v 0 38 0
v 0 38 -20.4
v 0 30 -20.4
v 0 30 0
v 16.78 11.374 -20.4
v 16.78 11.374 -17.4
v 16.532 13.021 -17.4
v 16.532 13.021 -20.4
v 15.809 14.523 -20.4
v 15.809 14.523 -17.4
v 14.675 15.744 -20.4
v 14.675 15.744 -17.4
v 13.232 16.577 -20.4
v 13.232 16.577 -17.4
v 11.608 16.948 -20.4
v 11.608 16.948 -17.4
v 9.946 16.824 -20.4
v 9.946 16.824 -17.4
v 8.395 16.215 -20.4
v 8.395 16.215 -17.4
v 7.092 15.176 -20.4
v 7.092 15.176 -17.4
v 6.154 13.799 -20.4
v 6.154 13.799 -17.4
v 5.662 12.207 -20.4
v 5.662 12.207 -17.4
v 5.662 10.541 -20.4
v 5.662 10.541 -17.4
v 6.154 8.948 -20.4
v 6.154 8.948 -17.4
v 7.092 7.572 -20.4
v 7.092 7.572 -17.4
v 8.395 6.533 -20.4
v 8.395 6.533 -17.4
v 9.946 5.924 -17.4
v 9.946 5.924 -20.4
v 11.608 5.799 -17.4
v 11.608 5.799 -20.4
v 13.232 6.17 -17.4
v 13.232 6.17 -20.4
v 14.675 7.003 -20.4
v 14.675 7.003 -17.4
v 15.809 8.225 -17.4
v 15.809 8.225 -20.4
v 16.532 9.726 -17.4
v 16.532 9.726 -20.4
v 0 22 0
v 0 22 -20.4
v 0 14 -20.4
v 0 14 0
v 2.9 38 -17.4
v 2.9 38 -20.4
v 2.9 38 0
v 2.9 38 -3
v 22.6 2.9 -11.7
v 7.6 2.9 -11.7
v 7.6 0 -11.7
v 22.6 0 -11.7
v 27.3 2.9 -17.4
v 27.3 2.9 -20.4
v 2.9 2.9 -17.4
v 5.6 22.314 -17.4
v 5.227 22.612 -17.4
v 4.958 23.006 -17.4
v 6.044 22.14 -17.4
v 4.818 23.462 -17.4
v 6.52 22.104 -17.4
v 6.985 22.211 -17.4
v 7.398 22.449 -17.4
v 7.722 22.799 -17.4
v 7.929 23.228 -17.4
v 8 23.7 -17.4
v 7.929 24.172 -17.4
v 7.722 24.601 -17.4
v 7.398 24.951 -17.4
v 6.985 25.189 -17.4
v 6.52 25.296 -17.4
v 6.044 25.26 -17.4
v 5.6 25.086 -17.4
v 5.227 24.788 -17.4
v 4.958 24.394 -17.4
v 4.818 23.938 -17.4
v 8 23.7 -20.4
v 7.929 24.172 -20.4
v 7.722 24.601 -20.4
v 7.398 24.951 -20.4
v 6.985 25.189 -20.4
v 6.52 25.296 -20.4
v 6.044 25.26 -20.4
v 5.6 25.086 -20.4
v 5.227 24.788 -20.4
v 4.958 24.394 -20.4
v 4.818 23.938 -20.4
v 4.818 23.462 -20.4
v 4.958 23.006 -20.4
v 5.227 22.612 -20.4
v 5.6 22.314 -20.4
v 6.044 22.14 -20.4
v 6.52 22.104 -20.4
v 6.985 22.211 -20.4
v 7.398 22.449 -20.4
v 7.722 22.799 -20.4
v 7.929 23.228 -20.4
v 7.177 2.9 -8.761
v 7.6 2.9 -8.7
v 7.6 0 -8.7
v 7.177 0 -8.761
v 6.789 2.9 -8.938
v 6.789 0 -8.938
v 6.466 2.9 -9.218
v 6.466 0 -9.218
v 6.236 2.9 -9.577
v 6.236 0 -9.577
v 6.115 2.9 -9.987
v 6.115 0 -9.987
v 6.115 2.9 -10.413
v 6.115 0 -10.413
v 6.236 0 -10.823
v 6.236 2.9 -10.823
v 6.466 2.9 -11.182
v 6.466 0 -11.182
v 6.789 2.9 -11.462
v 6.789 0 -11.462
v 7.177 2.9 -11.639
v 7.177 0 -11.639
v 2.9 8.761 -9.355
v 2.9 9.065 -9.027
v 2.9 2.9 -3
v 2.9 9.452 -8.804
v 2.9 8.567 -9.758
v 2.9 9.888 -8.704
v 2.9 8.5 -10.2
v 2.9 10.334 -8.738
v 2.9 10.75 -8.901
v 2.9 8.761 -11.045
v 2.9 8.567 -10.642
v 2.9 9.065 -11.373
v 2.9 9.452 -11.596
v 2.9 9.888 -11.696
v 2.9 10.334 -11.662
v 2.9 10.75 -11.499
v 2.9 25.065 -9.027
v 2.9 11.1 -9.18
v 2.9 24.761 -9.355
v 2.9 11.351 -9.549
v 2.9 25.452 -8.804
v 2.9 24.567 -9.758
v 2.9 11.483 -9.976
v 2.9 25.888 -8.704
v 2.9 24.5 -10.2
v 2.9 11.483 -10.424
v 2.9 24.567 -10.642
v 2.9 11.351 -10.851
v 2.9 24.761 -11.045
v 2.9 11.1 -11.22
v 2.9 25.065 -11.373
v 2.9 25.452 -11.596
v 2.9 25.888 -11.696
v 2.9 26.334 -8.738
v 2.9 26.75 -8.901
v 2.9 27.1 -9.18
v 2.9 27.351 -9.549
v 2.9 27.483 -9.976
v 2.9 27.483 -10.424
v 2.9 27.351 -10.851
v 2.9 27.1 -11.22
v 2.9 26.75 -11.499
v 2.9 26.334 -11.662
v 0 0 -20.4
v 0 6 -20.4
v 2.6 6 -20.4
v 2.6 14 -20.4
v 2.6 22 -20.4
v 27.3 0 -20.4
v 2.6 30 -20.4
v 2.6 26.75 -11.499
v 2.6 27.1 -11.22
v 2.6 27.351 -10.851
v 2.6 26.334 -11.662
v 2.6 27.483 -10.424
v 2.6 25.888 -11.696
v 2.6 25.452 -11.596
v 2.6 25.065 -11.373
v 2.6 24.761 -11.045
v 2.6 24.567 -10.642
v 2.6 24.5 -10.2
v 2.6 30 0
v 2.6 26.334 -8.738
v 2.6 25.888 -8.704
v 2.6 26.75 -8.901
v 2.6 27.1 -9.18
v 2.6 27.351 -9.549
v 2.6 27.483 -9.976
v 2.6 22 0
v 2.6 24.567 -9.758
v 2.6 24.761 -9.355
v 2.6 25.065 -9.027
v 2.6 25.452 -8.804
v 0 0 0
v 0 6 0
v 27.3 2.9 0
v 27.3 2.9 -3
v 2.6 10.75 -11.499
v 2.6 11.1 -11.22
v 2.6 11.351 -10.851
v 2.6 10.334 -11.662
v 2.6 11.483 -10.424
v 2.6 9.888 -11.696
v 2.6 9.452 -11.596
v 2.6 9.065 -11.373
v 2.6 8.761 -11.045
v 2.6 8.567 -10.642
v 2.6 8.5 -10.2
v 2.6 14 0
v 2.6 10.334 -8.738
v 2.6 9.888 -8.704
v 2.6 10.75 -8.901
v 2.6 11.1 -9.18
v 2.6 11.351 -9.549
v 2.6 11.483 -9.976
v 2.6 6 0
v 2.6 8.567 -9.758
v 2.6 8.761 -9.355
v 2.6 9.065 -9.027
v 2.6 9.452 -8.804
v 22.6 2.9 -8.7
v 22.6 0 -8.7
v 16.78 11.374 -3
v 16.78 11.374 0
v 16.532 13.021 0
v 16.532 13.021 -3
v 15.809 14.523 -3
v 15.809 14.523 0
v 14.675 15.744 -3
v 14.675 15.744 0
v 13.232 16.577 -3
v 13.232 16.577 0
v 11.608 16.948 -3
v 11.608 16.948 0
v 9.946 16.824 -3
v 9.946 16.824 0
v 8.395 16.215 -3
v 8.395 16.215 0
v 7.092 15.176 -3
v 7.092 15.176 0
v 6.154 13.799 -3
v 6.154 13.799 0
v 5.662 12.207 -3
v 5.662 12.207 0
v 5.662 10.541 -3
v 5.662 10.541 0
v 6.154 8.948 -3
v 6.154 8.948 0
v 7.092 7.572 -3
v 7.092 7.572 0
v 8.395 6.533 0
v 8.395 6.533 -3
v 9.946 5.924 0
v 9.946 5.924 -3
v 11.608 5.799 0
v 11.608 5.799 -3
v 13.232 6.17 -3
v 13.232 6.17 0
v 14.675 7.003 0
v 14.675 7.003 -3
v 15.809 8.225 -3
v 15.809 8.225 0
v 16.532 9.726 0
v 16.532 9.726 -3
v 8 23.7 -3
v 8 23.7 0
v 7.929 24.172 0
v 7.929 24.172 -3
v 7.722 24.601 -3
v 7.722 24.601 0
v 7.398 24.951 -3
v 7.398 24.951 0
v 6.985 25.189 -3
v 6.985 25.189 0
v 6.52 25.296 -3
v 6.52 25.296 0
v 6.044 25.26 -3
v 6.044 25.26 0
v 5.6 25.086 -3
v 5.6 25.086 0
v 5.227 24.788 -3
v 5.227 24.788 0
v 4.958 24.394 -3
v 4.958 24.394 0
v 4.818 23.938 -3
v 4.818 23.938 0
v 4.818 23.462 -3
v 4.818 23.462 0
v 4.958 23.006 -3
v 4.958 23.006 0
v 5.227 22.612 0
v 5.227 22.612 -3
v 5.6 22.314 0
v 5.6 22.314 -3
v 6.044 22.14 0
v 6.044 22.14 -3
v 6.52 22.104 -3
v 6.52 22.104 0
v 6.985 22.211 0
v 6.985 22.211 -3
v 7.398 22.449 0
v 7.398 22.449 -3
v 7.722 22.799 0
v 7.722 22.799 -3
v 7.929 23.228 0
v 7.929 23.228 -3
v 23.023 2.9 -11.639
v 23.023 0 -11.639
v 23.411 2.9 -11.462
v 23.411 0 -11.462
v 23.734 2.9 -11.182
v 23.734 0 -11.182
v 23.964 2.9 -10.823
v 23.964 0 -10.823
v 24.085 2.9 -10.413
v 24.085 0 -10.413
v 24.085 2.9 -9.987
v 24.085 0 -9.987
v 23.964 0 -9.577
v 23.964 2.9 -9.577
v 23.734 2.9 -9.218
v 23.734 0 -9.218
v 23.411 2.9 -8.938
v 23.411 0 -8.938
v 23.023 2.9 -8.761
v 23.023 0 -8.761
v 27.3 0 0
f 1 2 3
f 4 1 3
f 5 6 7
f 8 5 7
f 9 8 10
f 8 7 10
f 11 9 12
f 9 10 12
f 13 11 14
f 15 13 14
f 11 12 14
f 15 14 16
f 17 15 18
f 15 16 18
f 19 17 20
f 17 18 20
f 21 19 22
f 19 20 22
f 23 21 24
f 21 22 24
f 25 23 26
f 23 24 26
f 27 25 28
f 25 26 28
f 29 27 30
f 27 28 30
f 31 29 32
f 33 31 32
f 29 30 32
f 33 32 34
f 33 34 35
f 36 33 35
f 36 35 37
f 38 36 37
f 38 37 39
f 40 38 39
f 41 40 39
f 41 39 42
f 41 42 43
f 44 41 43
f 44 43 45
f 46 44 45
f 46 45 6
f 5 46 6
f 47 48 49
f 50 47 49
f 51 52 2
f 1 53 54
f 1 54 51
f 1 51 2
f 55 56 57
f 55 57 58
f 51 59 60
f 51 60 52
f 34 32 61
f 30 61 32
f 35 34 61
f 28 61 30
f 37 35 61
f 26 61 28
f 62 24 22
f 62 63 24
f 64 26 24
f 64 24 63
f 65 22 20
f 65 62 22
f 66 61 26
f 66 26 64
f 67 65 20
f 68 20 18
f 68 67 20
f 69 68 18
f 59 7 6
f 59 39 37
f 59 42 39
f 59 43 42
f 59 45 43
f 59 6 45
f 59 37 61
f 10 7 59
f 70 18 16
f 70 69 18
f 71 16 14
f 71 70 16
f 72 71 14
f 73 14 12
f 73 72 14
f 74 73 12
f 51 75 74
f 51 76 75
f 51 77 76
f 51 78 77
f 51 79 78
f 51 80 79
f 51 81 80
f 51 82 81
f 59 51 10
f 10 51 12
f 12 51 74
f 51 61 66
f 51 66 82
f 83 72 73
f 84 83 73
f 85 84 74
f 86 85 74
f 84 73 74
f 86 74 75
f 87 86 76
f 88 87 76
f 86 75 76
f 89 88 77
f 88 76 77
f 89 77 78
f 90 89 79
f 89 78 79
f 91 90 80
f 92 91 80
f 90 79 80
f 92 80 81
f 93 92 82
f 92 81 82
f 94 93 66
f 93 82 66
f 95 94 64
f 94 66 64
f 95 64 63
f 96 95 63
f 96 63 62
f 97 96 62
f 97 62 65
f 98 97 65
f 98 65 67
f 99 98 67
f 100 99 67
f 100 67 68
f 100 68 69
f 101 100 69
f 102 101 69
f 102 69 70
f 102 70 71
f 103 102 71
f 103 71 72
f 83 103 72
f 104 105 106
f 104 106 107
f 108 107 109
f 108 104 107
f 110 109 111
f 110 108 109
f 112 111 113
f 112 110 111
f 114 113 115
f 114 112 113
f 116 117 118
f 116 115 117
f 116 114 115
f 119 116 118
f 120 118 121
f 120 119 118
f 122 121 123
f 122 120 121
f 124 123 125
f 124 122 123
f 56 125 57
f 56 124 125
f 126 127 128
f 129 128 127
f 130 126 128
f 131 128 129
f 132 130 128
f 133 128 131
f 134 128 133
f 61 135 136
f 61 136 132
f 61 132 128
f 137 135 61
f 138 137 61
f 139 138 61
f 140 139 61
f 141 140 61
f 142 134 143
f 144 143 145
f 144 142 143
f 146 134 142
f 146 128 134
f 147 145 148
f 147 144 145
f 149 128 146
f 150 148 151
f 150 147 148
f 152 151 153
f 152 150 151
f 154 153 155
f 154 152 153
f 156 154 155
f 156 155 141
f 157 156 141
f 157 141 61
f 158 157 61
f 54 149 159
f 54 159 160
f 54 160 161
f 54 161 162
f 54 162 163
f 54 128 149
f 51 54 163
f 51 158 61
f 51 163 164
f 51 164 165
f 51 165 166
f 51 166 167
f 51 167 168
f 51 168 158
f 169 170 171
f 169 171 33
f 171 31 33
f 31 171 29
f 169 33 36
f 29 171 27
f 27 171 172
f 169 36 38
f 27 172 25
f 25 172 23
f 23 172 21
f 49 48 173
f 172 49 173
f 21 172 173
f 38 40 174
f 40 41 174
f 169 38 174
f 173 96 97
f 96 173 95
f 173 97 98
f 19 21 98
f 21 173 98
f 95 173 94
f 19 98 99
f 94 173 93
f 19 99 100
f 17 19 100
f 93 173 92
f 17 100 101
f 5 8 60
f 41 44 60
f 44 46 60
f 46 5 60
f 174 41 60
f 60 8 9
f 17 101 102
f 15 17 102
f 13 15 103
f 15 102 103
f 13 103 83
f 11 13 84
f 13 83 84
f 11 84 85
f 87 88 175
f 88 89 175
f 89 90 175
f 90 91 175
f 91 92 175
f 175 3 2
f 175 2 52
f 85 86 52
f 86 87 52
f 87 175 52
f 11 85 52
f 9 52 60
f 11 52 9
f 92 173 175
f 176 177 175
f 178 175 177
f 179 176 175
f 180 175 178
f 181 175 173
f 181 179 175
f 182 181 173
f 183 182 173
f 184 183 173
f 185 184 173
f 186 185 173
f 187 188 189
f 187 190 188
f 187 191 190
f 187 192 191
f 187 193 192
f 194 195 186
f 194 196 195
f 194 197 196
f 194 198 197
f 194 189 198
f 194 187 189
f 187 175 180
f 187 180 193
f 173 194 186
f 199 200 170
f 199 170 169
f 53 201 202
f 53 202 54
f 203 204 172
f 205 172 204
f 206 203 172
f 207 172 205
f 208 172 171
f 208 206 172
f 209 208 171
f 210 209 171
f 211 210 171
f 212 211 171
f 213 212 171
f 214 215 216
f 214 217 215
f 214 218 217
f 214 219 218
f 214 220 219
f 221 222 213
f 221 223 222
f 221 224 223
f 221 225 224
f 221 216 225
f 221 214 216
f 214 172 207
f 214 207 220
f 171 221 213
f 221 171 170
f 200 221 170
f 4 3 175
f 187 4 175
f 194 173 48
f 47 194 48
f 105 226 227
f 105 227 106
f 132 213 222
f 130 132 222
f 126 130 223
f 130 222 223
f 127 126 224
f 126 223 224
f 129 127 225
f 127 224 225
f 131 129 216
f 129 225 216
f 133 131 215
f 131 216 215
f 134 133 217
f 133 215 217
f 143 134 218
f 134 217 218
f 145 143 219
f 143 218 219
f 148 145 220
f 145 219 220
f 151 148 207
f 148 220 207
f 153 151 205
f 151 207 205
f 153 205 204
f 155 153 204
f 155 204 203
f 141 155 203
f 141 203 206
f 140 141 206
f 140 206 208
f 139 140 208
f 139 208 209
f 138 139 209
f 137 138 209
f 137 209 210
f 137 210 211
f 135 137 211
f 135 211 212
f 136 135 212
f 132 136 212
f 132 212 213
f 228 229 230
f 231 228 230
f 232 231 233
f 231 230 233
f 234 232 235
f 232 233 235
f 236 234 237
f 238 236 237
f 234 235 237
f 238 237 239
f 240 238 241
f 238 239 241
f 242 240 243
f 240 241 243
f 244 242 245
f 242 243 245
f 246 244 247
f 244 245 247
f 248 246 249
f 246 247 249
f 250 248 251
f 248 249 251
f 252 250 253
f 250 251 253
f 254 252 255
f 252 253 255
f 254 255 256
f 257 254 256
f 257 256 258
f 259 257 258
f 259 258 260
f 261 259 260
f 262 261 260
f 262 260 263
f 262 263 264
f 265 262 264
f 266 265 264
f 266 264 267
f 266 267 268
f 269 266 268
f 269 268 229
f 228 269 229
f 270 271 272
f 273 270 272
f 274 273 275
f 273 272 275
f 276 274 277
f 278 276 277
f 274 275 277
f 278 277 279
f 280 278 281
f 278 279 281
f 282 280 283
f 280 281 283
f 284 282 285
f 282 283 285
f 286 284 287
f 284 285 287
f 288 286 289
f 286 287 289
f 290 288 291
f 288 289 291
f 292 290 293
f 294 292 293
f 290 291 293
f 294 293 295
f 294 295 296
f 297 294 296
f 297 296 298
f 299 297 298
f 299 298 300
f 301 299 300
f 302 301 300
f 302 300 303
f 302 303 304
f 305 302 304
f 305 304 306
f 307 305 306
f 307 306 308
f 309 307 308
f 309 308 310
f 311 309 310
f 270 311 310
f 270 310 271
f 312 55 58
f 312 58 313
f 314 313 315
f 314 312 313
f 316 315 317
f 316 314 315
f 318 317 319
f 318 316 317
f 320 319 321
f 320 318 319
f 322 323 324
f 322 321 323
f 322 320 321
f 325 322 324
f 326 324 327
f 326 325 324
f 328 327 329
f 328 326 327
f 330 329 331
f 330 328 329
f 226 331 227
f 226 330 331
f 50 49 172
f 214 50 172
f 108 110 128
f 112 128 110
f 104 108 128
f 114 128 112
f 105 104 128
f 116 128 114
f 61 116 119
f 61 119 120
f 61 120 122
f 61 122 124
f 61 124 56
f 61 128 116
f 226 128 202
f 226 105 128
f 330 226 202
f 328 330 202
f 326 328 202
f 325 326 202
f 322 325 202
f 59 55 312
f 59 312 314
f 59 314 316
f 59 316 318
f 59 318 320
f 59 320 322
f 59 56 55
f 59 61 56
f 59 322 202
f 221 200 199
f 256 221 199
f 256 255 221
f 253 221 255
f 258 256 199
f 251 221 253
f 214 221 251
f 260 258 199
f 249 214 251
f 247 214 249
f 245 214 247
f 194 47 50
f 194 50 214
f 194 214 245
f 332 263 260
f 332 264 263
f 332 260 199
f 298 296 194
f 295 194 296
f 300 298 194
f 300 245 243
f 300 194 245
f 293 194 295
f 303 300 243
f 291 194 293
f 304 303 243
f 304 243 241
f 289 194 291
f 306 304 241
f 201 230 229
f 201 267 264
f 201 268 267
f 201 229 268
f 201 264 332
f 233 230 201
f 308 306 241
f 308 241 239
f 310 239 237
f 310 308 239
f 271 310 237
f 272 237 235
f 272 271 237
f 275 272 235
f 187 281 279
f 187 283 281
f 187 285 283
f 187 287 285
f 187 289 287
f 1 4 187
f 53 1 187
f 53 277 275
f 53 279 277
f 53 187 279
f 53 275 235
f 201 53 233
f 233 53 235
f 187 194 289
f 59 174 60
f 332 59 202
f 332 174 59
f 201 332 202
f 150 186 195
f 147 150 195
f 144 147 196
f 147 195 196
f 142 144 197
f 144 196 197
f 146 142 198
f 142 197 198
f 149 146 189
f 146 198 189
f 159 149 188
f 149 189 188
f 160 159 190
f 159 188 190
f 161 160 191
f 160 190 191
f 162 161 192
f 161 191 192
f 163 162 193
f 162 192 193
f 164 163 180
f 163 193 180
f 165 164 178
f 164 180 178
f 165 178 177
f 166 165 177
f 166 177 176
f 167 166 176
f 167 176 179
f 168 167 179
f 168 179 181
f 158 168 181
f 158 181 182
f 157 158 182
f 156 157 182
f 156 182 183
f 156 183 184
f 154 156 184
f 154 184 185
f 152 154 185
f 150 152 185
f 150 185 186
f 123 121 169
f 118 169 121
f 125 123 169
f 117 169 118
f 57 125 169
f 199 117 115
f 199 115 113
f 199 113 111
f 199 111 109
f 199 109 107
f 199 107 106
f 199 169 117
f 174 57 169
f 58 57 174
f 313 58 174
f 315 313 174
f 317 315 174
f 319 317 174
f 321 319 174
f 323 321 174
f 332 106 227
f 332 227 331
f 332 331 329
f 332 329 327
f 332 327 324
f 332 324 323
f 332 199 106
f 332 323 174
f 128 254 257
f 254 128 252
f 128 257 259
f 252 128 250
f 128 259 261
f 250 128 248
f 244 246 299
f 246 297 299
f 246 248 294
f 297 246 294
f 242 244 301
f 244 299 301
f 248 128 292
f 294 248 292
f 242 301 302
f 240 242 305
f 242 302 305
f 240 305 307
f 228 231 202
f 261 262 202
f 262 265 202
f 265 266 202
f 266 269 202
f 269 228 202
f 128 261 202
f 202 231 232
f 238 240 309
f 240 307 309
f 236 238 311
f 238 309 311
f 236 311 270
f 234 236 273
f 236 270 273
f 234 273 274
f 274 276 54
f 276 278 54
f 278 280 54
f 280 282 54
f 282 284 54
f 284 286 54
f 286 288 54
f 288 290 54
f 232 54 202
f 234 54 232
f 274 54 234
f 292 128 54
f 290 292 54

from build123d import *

# Parameters (mm, degrees)
CROQUIS1_R              = 5.59
CROQUIS1_R_2            = 1.6
SALIENTE_EXTRUIR1_DEPTH = 20.4
CROQUIS2_W              = 24.4
CROQUIS2_H              = 14.4
CORTAR_EXTRUIR1_DEPTH   = 35.1
CROQUIS3_R              = 1.5
CORTAR_EXTRUIR2_DEPTH   = 10
CORTAR_EXTRUIR3_DEPTH   = 10


with BuildPart() as part:
    # Croquis1 → Saliente-Extruir1 (new body)
    with BuildSketch(Plane.XY):
        Polygon((0, 0), (27.3, 0), (27.3, 2.9), (2.9, 38), (0, 38), (0, 30), (2.6, 30), (2.6, 22), (0, 22), (0, 14), (2.6, 14), (2.6, 6), (0, 6), align=None)
        with Locations((11.19, 11.3737)):
            Circle(CROQUIS1_R, mode=Mode.SUBTRACT)
        with Locations((6.4, 23.7)):
            Circle(CROQUIS1_R_2, mode=Mode.SUBTRACT)
    extrude(amount=-SALIENTE_EXTRUIR1_DEPTH)

    # Croquis2 → Cortar-Extruir1 (cut)
    with BuildSketch(Plane(origin=(0, 38, 0), x_dir=(1, 0, 0), z_dir=(0, 1, 0))):
        with Locations((15.1, 10.2)):
            Rectangle(CROQUIS2_W, CROQUIS2_H)
    extrude(amount=-CORTAR_EXTRUIR1_DEPTH, mode=Mode.SUBTRACT)

    # Croquis3 → Cortar-Extruir2 (cut)
    with BuildSketch(Plane.ZY.offset(-2.6)):
        with Locations(Location((-10.2, 26, 0), (0, 0, 270))):
            Circle(CROQUIS3_R)
        with Locations(Location((-10.2, 10, 0), (0, 0, 270))):
            Circle(CROQUIS3_R)
    extrude(amount=-CORTAR_EXTRUIR2_DEPTH, mode=Mode.SUBTRACT)

    # Croquis4 → Cortar-Extruir3 (cut)
    with BuildSketch(Plane(origin=(0, 2.9, 0), x_dir=(1, 0, 0), z_dir=(0, 1, 0))):
        with BuildLine():
            Line((22.6, 8.7), (7.6, 8.7))
            ThreePointArc((7.6, 8.7), (6.1, 10.2), (7.6, 11.7))
            Line((7.6, 11.7), (22.6, 11.7))
            ThreePointArc((22.6, 11.7), (24.1, 10.2), (22.6, 8.7))
        make_face()
    extrude(amount=-CORTAR_EXTRUIR3_DEPTH, mode=Mode.SUBTRACT)


solid = part.part
